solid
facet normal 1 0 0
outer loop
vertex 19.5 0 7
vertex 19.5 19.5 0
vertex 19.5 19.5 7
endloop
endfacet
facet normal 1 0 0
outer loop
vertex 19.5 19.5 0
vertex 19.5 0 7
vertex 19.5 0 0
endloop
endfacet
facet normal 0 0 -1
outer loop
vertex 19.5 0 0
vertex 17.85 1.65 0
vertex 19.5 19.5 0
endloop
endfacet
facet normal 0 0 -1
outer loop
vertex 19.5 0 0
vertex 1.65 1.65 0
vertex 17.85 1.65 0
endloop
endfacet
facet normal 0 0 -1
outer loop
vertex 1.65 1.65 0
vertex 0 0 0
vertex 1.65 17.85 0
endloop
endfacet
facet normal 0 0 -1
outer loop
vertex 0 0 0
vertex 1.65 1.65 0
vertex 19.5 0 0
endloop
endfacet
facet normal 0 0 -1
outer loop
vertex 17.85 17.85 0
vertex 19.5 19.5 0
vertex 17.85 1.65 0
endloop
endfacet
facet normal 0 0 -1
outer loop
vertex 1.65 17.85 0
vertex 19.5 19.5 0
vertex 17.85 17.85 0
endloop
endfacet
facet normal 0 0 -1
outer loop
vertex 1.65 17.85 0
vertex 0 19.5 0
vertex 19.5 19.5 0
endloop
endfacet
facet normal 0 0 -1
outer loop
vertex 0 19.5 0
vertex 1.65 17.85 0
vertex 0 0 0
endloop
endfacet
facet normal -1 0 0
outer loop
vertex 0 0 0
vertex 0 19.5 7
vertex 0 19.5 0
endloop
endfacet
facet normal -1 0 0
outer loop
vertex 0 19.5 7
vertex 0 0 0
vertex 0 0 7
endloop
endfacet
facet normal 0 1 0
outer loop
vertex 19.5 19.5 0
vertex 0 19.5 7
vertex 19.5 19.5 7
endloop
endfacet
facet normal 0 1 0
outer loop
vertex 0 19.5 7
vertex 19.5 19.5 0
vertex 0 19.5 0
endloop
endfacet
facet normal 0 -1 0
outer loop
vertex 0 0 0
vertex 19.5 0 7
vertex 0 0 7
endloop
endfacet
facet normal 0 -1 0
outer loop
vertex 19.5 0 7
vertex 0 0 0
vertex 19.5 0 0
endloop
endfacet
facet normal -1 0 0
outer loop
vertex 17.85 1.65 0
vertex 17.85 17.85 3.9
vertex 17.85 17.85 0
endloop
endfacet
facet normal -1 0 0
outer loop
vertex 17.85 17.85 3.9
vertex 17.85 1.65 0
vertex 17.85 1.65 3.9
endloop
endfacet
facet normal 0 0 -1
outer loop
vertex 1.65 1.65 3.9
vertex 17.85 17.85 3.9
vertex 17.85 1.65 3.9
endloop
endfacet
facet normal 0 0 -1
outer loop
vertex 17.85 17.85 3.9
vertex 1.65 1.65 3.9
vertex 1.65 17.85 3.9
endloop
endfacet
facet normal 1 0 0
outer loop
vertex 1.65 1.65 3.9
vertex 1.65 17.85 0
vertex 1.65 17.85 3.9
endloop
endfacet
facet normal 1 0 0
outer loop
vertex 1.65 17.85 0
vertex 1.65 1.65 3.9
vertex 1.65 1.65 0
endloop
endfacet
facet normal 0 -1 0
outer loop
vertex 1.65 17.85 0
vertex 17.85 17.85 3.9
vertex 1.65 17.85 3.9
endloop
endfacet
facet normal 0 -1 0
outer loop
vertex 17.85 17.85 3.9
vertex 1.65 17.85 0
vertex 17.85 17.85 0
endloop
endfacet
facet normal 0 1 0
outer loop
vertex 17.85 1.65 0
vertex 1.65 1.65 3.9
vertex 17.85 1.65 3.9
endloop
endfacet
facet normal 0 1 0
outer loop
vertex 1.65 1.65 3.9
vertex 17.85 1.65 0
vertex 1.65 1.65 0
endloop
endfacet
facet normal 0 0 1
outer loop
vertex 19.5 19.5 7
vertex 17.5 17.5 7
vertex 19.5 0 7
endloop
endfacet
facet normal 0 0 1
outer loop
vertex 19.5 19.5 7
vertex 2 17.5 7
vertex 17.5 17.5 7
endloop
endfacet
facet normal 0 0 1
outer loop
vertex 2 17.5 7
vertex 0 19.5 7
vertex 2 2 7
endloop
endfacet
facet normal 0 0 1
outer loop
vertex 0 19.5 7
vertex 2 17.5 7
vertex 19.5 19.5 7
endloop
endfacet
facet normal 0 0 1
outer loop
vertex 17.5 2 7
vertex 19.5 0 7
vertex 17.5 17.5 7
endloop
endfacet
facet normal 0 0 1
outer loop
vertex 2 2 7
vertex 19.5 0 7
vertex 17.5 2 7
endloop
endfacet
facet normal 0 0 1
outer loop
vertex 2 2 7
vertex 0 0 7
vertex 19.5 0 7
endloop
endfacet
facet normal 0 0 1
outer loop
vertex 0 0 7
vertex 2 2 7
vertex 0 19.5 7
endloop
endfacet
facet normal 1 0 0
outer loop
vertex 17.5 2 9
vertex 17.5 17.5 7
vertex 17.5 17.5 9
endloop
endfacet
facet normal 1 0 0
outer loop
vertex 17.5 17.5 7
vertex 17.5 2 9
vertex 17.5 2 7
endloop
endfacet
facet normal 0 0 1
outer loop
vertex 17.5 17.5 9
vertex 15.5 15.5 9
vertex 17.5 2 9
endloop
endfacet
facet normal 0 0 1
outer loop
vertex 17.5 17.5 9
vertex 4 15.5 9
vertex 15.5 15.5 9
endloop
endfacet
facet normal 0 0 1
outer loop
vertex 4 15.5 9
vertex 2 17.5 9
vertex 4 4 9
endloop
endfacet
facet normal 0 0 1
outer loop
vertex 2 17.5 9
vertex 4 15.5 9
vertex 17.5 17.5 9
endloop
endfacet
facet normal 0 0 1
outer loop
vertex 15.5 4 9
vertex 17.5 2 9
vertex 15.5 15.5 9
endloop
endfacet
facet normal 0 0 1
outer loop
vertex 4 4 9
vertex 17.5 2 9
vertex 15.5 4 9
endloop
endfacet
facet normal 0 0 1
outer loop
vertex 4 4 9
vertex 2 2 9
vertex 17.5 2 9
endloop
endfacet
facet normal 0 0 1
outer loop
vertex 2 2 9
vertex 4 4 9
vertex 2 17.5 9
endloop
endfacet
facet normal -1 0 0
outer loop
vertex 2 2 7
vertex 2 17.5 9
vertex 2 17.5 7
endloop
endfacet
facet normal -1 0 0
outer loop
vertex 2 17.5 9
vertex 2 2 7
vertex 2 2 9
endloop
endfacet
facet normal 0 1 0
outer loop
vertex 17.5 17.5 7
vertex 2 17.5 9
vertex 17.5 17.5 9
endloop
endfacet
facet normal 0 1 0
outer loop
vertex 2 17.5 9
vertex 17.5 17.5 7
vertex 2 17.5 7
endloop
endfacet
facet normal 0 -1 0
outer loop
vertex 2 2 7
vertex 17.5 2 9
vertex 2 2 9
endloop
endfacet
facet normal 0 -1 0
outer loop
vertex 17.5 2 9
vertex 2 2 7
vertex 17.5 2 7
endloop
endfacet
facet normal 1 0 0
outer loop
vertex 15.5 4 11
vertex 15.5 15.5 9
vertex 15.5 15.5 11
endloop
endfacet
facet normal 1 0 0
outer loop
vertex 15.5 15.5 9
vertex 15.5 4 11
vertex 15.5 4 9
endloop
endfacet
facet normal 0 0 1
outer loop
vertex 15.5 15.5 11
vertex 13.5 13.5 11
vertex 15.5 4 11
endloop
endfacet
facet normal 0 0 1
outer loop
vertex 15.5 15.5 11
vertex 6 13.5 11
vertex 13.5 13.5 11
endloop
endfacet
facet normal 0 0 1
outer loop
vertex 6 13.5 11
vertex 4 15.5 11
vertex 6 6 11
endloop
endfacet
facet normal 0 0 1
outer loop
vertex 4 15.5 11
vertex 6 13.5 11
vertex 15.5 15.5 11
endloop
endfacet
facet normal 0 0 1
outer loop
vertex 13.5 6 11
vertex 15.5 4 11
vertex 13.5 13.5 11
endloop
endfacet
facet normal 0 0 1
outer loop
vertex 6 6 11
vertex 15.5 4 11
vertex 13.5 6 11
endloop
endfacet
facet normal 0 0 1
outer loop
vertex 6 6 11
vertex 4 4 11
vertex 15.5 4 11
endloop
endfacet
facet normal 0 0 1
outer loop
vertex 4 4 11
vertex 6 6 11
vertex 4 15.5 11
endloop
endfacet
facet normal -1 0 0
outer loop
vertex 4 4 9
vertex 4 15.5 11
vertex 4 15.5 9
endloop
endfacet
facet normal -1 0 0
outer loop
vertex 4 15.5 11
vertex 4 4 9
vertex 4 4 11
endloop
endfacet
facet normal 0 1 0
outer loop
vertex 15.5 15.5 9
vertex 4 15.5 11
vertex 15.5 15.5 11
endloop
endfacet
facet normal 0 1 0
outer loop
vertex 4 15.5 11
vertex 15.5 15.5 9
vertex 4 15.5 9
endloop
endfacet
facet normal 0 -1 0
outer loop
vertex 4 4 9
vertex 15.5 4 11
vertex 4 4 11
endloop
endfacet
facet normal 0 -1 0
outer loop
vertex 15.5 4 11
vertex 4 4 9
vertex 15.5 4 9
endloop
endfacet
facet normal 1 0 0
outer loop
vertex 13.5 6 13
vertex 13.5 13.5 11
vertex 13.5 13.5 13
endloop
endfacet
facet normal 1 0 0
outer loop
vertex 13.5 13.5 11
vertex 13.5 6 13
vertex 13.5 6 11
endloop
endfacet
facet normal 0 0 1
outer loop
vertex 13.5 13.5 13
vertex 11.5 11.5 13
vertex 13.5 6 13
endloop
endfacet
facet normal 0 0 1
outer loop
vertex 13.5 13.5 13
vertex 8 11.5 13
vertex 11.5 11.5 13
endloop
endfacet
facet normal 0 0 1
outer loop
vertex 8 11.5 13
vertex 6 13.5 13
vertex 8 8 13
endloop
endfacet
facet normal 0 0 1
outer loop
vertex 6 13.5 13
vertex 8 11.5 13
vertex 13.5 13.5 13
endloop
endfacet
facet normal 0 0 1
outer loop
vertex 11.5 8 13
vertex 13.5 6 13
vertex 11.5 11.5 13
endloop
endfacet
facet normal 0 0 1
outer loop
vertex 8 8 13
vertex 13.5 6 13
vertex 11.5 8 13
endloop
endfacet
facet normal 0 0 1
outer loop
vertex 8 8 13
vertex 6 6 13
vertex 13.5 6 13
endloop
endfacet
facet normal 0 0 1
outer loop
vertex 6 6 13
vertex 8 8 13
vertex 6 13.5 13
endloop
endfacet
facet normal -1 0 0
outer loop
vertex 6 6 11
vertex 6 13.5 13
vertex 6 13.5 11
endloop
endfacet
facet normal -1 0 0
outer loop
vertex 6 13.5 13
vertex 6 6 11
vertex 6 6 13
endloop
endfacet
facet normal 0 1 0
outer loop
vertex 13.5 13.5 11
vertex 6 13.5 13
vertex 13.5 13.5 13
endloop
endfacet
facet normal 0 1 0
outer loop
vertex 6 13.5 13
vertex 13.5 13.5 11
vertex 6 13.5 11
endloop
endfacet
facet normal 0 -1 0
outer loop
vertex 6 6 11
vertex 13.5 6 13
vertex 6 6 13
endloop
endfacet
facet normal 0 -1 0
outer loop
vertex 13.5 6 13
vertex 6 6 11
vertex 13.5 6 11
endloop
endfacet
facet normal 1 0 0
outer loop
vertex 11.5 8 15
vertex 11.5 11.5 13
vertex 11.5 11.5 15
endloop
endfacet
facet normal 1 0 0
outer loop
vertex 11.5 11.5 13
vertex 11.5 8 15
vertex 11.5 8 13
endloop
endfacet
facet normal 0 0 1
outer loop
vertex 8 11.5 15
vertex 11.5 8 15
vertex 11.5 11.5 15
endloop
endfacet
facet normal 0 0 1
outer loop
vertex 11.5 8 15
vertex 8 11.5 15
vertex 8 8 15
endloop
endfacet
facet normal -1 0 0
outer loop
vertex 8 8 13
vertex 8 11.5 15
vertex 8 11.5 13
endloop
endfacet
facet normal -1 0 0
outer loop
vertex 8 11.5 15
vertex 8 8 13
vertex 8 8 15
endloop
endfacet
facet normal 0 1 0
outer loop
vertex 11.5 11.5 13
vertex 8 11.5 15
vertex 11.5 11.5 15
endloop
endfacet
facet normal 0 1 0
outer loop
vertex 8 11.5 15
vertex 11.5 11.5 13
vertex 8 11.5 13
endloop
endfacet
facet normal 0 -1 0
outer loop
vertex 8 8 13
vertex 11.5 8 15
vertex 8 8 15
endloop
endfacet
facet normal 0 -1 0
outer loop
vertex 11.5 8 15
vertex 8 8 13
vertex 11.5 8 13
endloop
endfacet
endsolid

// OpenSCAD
//    $$$$$$\   $$$$$$\   $$$$$$\  $$\   $$\ $$$$$$\ $$$$$$$\  $$$$$$$$\ 
//    $$  __$$\ $$  __$$\ $$  __$$\ $$ |  $$ |\_$$  _|$$  __$$\ $$  _____|
//    $$ /  $$ |$$ /  \__|$$ /  $$ |$$ |  $$ |  $$ |  $$ |  $$ |$$ |      
//    $$$$$$$$ |$$ |      $$ |  $$ |$$ |  $$ |  $$ |  $$$$$$$  |$$$$$\    
//    $$  __$$ |$$ |      $$ |  $$ |$$ |  $$ |  $$ |  $$  __$$< $$  __|   
//    $$ |  $$ |$$ |  $$\ $$ $$\$$ |$$ |  $$ |  $$ |  $$ |  $$ |$$ |      
//    $$ |  $$ |\$$$$$$  |\$$$$$$ / \$$$$$$  |$$$$$$\ $$ |  $$ |$$$$$$$$\ 
//    \__|  \__| \______/  \___$$$\  \______/ \______|\__|  \__|\________|
//                            \___|                                      
//      
//       Print and play - OpenScad project - by Bekkalizer and ChatGPT

// Parameters
bottom_hotel = [19.5, 19.5, 5]; // Main cube dimensions
step_height_dimension = 2;
step_width_dimension = 2;
number_of_steps = 4;

module cube_with_extruded_bottom( cube_size = [1,1,1] ) {
    //Main build script parameters:
    max_width = 19.2;
    top_lip = 2;
    top_height = 3;
    //Calculated hole size:
    inside_margins = 1;
    hole_width = max_width - 2 * (top_lip) + inside_margins;
    hole_height = top_height + inside_margins;
    
    hole_size = [hole_width, hole_width, hole_height]; // Hole dimensions (same height as cube)
    hole_offset = [(cube_size[0] - hole_size[0]) / 2, (cube_size[1] - hole_size[1]) / 2, -0.1]; // Centered on bottom
    difference() {
        // Main Cube
        cube(cube_size);
       
        // Hole Cube (subtracting from bottom)
        translate(hole_offset)
            cube(hole_size);
    }
}

// Draw the main hotel lobby 
cube_with_extruded_bottom(bottom_hotel);
for( i = [0 : number_of_steps] ) {
    step_height = step_height_dimension;
    step_width = step_width_dimension;
    translate([step_width*i,step_width * i,bottom_hotel[2] + step_height * i]) {
        cube([bottom_hotel[0]-step_width*2*i, bottom_hotel[1]-step_width*2*i, step_height]);
    }
}
